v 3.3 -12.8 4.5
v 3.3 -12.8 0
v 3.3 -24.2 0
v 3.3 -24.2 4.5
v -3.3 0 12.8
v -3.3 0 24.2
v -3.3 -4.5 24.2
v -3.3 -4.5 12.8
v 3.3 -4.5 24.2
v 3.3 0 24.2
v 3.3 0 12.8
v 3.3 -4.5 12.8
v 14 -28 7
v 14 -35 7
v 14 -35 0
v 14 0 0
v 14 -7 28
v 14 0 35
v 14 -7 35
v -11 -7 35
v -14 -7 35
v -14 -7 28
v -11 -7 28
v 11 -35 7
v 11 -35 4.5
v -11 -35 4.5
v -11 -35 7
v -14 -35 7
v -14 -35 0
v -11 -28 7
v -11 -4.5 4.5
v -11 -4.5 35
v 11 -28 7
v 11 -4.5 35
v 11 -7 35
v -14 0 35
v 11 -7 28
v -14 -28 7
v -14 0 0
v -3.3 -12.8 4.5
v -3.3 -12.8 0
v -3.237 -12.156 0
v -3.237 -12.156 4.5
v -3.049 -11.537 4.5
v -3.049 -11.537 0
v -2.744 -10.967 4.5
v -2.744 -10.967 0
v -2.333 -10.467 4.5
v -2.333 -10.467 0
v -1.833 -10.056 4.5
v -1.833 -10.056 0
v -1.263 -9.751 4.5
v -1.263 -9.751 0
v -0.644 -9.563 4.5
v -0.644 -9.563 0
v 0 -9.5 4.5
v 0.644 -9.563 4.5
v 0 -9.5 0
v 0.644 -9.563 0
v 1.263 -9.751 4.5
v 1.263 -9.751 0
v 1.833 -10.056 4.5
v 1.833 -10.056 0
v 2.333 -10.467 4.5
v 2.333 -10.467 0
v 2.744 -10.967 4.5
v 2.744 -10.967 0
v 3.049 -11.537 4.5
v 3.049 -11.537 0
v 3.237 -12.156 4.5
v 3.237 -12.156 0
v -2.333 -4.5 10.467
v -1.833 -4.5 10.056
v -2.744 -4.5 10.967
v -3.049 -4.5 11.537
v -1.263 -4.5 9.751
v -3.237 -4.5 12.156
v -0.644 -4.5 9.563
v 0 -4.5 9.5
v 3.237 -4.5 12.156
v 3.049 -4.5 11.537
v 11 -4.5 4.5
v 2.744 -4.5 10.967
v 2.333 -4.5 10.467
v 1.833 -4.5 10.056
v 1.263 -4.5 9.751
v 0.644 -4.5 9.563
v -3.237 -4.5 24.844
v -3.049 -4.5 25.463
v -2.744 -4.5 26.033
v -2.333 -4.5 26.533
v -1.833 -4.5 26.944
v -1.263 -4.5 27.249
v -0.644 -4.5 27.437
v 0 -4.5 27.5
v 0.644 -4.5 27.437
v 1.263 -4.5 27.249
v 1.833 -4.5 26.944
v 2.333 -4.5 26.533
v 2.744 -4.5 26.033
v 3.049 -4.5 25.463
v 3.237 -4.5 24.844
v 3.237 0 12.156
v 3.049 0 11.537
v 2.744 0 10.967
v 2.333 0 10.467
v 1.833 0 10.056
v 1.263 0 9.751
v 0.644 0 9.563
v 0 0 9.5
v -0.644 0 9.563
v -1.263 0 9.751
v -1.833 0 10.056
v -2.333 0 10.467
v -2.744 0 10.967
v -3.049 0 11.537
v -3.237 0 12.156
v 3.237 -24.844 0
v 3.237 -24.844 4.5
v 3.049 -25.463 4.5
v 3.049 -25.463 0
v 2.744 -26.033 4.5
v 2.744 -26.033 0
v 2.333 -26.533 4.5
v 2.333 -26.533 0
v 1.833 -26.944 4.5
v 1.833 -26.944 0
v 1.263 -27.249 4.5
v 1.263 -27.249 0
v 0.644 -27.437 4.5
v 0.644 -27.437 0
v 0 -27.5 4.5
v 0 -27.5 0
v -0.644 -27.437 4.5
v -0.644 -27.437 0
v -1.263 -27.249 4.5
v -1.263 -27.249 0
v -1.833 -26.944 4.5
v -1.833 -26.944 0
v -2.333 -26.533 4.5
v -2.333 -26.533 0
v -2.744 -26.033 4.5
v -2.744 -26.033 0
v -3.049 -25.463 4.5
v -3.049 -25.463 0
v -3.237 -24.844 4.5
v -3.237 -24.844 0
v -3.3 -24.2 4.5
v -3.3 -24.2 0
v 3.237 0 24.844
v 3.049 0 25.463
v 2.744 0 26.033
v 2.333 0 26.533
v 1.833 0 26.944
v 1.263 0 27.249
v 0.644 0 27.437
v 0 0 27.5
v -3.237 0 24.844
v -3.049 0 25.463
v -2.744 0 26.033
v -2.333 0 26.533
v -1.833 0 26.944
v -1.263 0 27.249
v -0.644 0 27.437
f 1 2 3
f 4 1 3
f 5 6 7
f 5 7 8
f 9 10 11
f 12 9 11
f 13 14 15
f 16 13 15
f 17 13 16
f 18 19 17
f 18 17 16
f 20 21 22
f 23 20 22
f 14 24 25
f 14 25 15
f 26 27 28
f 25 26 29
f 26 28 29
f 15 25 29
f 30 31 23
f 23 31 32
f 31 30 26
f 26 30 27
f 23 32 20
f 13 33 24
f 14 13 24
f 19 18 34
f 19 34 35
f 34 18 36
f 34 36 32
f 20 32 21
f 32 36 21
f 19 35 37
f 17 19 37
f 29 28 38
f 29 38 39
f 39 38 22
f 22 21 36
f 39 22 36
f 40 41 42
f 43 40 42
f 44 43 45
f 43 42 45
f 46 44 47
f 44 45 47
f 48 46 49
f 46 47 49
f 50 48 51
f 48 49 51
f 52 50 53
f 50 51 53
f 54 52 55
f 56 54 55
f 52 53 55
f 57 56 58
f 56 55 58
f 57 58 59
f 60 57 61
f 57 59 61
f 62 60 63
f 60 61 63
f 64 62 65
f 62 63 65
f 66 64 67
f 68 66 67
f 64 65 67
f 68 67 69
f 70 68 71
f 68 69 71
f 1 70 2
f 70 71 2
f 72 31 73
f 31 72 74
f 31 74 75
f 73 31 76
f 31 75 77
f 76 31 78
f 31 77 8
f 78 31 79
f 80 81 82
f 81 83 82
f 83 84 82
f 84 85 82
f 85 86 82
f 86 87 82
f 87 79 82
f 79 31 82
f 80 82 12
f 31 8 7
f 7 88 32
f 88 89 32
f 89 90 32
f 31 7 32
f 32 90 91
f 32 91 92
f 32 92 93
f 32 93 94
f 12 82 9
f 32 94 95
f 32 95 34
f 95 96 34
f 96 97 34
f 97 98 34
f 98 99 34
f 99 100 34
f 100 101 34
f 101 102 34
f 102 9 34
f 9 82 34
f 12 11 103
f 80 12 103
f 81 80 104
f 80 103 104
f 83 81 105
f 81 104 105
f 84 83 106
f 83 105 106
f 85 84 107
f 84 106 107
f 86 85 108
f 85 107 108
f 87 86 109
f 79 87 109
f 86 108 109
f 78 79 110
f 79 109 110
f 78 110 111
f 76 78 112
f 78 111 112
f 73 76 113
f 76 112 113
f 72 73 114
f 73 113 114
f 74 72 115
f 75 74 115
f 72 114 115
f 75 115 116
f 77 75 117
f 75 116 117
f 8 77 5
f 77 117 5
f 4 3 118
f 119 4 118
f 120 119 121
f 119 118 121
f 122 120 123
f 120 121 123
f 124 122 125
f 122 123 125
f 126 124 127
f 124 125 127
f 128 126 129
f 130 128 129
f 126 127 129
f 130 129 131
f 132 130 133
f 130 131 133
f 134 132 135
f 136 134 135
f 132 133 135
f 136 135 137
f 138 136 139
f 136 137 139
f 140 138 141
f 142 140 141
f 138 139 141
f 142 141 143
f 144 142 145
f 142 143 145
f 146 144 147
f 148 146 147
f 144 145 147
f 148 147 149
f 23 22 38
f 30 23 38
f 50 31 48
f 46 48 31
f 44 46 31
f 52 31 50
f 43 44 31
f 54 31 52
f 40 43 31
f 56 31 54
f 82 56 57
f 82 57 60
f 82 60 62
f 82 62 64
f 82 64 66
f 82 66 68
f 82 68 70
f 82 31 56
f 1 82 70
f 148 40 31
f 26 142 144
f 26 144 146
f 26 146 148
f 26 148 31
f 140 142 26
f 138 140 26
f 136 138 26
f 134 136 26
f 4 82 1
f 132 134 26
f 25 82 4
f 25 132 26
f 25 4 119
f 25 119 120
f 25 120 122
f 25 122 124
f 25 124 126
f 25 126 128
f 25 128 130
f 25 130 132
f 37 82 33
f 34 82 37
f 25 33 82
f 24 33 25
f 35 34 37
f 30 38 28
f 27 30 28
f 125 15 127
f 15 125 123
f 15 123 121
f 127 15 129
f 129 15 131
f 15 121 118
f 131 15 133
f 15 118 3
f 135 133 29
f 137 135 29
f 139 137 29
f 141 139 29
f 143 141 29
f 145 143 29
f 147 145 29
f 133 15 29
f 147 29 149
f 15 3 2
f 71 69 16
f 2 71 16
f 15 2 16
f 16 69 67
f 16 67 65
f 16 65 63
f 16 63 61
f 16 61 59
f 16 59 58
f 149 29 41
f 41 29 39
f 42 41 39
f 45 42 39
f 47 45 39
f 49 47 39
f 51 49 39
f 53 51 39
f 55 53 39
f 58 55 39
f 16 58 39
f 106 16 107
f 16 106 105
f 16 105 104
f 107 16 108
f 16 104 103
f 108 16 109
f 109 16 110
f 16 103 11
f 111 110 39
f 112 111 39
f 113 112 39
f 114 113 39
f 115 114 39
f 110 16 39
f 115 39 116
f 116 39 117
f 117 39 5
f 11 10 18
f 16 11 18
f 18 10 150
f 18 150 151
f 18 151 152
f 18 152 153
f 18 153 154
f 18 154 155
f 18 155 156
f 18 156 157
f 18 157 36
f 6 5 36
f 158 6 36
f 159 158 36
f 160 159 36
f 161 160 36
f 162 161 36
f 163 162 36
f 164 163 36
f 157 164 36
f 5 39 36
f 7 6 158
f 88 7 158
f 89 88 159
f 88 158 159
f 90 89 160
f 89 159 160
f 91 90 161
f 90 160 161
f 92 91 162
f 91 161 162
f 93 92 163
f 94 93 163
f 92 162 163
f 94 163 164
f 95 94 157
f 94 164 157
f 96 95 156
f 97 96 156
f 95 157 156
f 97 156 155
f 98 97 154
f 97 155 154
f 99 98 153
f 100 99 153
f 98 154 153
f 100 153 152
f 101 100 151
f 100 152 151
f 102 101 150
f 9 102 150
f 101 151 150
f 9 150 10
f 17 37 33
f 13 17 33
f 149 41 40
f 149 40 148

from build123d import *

# Parameters (mm, degrees)
PAD_DEPTH            = 14
BOX_W                = 33
BOX_H                = 33
BOX_DEPTH            = 22
POCKET_DEPTH         = 4.5
POCKET001_DEPTH      = 4.5
BODY_ROLL_ANGLE      = 90
BODY_PLACEMENT_ANGLE = -90


with BuildPart() as part:
    # Sketch → Pad (new body, symmetric)
    with BuildSketch(Plane.XY):
        Polygon((0, 0), (0, 35), (7, 35), (7, 28), (28, 7), (35, 7), (35, 0), align=None)
    extrude(amount=PAD_DEPTH, both=True)

    # Box → Box (cut)
    with BuildSketch(Plane(origin=(4.5, 4.5, -11), x_dir=(1, 0, 0), z_dir=(0, 0, 1))):
        with Locations((16.5, 16.5)):
            Rectangle(BOX_W, BOX_H)
    extrude(amount=BOX_DEPTH, mode=Mode.SUBTRACT)

    # Sketch001 (on Face1 of Box) → Pocket (cut)
    with BuildSketch(Plane(origin=(0, 0, 0), x_dir=(0, -1, 0), z_dir=(-1, 0, 0))):
        with BuildLine():
            ThreePointArc((-24.2, 3.3), (-27.5, 0), (-24.2, -3.3))
            Line((-24.2, -3.3), (-12.8, -3.3))
            ThreePointArc((-12.8, -3.3), (-9.5, 0), (-12.8, 3.3))
            Line((-24.2, 3.3), (-12.8, 3.3))
        make_face()
    extrude(amount=-POCKET_DEPTH, mode=Mode.SUBTRACT)

    # Sketch002 (on Face2 of Pocket) → Pocket001 (cut)
    with BuildSketch(Plane.XZ):
        with BuildLine():
            ThreePointArc((12.8, 3.3), (9.5, 0), (12.8, -3.3))
            Line((12.8, -3.3), (24.2, -3.3))
            ThreePointArc((24.2, -3.3), (27.5, 0), (24.2, 3.3))
            Line((12.8, 3.3), (24.2, 3.3))
        make_face()
    extrude(amount=-POCKET001_DEPTH, mode=Mode.SUBTRACT)


with BuildPart() as part_1:
    # Body roll: moved
    add(part.part.rotate(Axis((0, 0, 0), (1, 0, 0)), BODY_ROLL_ANGLE))


with BuildPart() as part_2:
    # Body placement: moved
    add(part_1.part.rotate(Axis((0, 0, 0), (0, 0, 1)), BODY_PLACEMENT_ANGLE))


solid = part_2.part
